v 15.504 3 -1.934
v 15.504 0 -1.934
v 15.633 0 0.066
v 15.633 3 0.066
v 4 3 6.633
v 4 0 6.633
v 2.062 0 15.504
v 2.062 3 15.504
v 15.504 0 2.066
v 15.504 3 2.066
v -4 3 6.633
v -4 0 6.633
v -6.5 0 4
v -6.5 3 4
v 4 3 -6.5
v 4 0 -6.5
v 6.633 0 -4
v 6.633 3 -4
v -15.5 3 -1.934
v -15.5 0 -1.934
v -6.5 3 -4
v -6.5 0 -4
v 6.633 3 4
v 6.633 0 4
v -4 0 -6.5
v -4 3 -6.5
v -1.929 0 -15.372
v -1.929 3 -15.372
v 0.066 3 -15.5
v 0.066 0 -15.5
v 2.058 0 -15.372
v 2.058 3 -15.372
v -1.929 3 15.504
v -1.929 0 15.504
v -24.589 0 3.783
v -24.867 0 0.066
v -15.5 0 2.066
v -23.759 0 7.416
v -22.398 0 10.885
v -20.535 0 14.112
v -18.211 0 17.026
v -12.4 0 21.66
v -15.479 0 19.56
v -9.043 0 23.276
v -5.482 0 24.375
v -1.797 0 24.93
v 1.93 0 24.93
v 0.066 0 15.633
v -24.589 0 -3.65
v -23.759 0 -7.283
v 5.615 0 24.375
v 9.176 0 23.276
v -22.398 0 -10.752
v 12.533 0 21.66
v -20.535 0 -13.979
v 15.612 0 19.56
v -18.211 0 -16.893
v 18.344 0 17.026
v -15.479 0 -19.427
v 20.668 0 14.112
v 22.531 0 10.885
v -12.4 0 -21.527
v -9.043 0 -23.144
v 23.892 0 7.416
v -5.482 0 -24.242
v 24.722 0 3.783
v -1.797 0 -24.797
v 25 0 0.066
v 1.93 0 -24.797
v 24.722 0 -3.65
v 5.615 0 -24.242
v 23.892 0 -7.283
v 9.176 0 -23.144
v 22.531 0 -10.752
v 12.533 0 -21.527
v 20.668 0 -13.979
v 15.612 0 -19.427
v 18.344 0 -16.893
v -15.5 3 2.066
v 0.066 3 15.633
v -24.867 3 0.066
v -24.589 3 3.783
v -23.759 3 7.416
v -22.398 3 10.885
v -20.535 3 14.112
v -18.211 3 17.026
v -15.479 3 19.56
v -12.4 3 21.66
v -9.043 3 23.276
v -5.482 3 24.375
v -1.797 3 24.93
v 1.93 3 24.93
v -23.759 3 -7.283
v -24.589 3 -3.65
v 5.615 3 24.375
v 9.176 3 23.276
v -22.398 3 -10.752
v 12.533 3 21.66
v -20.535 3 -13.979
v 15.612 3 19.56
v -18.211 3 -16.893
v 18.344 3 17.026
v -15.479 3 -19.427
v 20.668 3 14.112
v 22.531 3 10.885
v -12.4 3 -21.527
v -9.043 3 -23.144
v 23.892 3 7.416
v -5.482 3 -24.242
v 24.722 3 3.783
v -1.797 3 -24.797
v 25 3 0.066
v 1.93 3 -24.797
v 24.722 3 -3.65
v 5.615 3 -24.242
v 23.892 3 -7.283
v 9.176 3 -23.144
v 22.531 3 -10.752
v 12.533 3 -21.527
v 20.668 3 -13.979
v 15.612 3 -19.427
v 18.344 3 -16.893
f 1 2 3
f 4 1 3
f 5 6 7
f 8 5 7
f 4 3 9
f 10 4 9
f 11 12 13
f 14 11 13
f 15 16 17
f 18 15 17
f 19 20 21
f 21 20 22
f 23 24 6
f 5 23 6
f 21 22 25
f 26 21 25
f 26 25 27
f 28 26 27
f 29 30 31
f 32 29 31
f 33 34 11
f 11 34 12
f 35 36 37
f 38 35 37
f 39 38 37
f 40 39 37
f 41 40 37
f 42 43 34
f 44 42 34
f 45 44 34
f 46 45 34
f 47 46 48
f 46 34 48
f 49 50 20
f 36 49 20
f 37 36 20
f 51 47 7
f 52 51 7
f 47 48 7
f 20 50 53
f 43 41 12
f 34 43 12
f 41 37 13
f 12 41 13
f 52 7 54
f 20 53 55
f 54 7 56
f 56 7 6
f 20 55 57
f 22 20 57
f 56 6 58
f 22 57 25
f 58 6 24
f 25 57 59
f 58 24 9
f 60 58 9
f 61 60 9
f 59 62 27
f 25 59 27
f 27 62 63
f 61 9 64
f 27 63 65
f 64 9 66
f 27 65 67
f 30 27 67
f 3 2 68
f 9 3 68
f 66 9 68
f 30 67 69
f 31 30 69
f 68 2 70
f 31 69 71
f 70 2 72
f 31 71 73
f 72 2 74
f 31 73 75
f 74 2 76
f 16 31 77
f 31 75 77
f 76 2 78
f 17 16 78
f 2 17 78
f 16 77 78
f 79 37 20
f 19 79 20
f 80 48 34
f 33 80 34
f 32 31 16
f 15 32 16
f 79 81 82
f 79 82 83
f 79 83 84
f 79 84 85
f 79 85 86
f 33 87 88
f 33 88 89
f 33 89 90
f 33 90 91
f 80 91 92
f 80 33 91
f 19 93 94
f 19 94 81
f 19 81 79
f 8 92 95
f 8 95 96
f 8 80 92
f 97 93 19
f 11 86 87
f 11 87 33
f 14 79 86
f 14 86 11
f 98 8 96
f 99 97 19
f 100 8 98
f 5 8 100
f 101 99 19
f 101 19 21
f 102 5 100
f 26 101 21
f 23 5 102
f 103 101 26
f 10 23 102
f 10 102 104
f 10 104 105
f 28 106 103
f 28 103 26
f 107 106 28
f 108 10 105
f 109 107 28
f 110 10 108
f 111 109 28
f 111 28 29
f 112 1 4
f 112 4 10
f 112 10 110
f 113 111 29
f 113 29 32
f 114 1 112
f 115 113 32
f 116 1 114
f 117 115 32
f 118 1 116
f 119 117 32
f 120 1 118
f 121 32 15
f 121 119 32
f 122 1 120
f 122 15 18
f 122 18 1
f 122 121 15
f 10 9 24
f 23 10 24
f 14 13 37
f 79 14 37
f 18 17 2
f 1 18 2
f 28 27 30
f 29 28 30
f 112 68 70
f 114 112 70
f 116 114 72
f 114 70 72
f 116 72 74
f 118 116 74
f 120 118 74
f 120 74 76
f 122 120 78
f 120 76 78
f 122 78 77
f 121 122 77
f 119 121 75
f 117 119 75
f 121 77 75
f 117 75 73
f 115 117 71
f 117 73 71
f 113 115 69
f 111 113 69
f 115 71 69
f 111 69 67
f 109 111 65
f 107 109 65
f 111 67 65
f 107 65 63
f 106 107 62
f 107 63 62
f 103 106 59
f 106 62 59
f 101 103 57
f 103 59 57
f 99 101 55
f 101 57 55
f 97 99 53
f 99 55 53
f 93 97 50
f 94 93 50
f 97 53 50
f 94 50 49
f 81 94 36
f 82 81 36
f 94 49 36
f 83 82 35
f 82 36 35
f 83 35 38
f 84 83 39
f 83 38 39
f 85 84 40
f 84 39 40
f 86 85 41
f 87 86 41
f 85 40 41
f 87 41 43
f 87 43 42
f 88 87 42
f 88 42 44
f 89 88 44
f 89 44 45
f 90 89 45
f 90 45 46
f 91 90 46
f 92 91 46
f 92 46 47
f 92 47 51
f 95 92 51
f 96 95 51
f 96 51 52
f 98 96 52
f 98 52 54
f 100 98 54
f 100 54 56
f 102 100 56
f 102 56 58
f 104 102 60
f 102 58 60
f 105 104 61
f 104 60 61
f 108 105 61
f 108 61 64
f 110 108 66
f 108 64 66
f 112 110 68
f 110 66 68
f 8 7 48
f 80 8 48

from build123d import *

# Parameters (mm, degrees)
SKETCH1_R           = 24.933599888
BOSS_EXTRUDE1_DEPTH = 3


with BuildPart() as part:
    # Sketch1 → Boss-Extrude1 (new body)
    with BuildSketch(Plane(origin=(0, 0, 0), x_dir=(1, 0, 0), z_dir=(0, 1, 0))):
        with Locations((0.066400112, -0.066400112)):
            Circle(SKETCH1_R)
        Polygon((-15.5, -0.066400112), (-15.5, 1.933599888), (-6.5, 4), (-4, 6.5), (-1.929468724, 15.371518143), (0.066400112, 15.5), (2.058453157, 15.372010982), (4, 6.5), (6.632800224, 4), (15.503783714, 1.933599888), (15.632800224, -0.066400112), (15.503783714, -2.066400112), (6.632800224, -4), (4, -6.632800224), (2.062268949, -15.504318367), (0.066400112, -15.632800224), (-1.929468724, -15.504318367), (-4, -6.632800224), (-6.5, -4), (-15.5, -2.066400112), align=None, mode=Mode.SUBTRACT)
    extrude(amount=BOSS_EXTRUDE1_DEPTH)


solid = part.part
